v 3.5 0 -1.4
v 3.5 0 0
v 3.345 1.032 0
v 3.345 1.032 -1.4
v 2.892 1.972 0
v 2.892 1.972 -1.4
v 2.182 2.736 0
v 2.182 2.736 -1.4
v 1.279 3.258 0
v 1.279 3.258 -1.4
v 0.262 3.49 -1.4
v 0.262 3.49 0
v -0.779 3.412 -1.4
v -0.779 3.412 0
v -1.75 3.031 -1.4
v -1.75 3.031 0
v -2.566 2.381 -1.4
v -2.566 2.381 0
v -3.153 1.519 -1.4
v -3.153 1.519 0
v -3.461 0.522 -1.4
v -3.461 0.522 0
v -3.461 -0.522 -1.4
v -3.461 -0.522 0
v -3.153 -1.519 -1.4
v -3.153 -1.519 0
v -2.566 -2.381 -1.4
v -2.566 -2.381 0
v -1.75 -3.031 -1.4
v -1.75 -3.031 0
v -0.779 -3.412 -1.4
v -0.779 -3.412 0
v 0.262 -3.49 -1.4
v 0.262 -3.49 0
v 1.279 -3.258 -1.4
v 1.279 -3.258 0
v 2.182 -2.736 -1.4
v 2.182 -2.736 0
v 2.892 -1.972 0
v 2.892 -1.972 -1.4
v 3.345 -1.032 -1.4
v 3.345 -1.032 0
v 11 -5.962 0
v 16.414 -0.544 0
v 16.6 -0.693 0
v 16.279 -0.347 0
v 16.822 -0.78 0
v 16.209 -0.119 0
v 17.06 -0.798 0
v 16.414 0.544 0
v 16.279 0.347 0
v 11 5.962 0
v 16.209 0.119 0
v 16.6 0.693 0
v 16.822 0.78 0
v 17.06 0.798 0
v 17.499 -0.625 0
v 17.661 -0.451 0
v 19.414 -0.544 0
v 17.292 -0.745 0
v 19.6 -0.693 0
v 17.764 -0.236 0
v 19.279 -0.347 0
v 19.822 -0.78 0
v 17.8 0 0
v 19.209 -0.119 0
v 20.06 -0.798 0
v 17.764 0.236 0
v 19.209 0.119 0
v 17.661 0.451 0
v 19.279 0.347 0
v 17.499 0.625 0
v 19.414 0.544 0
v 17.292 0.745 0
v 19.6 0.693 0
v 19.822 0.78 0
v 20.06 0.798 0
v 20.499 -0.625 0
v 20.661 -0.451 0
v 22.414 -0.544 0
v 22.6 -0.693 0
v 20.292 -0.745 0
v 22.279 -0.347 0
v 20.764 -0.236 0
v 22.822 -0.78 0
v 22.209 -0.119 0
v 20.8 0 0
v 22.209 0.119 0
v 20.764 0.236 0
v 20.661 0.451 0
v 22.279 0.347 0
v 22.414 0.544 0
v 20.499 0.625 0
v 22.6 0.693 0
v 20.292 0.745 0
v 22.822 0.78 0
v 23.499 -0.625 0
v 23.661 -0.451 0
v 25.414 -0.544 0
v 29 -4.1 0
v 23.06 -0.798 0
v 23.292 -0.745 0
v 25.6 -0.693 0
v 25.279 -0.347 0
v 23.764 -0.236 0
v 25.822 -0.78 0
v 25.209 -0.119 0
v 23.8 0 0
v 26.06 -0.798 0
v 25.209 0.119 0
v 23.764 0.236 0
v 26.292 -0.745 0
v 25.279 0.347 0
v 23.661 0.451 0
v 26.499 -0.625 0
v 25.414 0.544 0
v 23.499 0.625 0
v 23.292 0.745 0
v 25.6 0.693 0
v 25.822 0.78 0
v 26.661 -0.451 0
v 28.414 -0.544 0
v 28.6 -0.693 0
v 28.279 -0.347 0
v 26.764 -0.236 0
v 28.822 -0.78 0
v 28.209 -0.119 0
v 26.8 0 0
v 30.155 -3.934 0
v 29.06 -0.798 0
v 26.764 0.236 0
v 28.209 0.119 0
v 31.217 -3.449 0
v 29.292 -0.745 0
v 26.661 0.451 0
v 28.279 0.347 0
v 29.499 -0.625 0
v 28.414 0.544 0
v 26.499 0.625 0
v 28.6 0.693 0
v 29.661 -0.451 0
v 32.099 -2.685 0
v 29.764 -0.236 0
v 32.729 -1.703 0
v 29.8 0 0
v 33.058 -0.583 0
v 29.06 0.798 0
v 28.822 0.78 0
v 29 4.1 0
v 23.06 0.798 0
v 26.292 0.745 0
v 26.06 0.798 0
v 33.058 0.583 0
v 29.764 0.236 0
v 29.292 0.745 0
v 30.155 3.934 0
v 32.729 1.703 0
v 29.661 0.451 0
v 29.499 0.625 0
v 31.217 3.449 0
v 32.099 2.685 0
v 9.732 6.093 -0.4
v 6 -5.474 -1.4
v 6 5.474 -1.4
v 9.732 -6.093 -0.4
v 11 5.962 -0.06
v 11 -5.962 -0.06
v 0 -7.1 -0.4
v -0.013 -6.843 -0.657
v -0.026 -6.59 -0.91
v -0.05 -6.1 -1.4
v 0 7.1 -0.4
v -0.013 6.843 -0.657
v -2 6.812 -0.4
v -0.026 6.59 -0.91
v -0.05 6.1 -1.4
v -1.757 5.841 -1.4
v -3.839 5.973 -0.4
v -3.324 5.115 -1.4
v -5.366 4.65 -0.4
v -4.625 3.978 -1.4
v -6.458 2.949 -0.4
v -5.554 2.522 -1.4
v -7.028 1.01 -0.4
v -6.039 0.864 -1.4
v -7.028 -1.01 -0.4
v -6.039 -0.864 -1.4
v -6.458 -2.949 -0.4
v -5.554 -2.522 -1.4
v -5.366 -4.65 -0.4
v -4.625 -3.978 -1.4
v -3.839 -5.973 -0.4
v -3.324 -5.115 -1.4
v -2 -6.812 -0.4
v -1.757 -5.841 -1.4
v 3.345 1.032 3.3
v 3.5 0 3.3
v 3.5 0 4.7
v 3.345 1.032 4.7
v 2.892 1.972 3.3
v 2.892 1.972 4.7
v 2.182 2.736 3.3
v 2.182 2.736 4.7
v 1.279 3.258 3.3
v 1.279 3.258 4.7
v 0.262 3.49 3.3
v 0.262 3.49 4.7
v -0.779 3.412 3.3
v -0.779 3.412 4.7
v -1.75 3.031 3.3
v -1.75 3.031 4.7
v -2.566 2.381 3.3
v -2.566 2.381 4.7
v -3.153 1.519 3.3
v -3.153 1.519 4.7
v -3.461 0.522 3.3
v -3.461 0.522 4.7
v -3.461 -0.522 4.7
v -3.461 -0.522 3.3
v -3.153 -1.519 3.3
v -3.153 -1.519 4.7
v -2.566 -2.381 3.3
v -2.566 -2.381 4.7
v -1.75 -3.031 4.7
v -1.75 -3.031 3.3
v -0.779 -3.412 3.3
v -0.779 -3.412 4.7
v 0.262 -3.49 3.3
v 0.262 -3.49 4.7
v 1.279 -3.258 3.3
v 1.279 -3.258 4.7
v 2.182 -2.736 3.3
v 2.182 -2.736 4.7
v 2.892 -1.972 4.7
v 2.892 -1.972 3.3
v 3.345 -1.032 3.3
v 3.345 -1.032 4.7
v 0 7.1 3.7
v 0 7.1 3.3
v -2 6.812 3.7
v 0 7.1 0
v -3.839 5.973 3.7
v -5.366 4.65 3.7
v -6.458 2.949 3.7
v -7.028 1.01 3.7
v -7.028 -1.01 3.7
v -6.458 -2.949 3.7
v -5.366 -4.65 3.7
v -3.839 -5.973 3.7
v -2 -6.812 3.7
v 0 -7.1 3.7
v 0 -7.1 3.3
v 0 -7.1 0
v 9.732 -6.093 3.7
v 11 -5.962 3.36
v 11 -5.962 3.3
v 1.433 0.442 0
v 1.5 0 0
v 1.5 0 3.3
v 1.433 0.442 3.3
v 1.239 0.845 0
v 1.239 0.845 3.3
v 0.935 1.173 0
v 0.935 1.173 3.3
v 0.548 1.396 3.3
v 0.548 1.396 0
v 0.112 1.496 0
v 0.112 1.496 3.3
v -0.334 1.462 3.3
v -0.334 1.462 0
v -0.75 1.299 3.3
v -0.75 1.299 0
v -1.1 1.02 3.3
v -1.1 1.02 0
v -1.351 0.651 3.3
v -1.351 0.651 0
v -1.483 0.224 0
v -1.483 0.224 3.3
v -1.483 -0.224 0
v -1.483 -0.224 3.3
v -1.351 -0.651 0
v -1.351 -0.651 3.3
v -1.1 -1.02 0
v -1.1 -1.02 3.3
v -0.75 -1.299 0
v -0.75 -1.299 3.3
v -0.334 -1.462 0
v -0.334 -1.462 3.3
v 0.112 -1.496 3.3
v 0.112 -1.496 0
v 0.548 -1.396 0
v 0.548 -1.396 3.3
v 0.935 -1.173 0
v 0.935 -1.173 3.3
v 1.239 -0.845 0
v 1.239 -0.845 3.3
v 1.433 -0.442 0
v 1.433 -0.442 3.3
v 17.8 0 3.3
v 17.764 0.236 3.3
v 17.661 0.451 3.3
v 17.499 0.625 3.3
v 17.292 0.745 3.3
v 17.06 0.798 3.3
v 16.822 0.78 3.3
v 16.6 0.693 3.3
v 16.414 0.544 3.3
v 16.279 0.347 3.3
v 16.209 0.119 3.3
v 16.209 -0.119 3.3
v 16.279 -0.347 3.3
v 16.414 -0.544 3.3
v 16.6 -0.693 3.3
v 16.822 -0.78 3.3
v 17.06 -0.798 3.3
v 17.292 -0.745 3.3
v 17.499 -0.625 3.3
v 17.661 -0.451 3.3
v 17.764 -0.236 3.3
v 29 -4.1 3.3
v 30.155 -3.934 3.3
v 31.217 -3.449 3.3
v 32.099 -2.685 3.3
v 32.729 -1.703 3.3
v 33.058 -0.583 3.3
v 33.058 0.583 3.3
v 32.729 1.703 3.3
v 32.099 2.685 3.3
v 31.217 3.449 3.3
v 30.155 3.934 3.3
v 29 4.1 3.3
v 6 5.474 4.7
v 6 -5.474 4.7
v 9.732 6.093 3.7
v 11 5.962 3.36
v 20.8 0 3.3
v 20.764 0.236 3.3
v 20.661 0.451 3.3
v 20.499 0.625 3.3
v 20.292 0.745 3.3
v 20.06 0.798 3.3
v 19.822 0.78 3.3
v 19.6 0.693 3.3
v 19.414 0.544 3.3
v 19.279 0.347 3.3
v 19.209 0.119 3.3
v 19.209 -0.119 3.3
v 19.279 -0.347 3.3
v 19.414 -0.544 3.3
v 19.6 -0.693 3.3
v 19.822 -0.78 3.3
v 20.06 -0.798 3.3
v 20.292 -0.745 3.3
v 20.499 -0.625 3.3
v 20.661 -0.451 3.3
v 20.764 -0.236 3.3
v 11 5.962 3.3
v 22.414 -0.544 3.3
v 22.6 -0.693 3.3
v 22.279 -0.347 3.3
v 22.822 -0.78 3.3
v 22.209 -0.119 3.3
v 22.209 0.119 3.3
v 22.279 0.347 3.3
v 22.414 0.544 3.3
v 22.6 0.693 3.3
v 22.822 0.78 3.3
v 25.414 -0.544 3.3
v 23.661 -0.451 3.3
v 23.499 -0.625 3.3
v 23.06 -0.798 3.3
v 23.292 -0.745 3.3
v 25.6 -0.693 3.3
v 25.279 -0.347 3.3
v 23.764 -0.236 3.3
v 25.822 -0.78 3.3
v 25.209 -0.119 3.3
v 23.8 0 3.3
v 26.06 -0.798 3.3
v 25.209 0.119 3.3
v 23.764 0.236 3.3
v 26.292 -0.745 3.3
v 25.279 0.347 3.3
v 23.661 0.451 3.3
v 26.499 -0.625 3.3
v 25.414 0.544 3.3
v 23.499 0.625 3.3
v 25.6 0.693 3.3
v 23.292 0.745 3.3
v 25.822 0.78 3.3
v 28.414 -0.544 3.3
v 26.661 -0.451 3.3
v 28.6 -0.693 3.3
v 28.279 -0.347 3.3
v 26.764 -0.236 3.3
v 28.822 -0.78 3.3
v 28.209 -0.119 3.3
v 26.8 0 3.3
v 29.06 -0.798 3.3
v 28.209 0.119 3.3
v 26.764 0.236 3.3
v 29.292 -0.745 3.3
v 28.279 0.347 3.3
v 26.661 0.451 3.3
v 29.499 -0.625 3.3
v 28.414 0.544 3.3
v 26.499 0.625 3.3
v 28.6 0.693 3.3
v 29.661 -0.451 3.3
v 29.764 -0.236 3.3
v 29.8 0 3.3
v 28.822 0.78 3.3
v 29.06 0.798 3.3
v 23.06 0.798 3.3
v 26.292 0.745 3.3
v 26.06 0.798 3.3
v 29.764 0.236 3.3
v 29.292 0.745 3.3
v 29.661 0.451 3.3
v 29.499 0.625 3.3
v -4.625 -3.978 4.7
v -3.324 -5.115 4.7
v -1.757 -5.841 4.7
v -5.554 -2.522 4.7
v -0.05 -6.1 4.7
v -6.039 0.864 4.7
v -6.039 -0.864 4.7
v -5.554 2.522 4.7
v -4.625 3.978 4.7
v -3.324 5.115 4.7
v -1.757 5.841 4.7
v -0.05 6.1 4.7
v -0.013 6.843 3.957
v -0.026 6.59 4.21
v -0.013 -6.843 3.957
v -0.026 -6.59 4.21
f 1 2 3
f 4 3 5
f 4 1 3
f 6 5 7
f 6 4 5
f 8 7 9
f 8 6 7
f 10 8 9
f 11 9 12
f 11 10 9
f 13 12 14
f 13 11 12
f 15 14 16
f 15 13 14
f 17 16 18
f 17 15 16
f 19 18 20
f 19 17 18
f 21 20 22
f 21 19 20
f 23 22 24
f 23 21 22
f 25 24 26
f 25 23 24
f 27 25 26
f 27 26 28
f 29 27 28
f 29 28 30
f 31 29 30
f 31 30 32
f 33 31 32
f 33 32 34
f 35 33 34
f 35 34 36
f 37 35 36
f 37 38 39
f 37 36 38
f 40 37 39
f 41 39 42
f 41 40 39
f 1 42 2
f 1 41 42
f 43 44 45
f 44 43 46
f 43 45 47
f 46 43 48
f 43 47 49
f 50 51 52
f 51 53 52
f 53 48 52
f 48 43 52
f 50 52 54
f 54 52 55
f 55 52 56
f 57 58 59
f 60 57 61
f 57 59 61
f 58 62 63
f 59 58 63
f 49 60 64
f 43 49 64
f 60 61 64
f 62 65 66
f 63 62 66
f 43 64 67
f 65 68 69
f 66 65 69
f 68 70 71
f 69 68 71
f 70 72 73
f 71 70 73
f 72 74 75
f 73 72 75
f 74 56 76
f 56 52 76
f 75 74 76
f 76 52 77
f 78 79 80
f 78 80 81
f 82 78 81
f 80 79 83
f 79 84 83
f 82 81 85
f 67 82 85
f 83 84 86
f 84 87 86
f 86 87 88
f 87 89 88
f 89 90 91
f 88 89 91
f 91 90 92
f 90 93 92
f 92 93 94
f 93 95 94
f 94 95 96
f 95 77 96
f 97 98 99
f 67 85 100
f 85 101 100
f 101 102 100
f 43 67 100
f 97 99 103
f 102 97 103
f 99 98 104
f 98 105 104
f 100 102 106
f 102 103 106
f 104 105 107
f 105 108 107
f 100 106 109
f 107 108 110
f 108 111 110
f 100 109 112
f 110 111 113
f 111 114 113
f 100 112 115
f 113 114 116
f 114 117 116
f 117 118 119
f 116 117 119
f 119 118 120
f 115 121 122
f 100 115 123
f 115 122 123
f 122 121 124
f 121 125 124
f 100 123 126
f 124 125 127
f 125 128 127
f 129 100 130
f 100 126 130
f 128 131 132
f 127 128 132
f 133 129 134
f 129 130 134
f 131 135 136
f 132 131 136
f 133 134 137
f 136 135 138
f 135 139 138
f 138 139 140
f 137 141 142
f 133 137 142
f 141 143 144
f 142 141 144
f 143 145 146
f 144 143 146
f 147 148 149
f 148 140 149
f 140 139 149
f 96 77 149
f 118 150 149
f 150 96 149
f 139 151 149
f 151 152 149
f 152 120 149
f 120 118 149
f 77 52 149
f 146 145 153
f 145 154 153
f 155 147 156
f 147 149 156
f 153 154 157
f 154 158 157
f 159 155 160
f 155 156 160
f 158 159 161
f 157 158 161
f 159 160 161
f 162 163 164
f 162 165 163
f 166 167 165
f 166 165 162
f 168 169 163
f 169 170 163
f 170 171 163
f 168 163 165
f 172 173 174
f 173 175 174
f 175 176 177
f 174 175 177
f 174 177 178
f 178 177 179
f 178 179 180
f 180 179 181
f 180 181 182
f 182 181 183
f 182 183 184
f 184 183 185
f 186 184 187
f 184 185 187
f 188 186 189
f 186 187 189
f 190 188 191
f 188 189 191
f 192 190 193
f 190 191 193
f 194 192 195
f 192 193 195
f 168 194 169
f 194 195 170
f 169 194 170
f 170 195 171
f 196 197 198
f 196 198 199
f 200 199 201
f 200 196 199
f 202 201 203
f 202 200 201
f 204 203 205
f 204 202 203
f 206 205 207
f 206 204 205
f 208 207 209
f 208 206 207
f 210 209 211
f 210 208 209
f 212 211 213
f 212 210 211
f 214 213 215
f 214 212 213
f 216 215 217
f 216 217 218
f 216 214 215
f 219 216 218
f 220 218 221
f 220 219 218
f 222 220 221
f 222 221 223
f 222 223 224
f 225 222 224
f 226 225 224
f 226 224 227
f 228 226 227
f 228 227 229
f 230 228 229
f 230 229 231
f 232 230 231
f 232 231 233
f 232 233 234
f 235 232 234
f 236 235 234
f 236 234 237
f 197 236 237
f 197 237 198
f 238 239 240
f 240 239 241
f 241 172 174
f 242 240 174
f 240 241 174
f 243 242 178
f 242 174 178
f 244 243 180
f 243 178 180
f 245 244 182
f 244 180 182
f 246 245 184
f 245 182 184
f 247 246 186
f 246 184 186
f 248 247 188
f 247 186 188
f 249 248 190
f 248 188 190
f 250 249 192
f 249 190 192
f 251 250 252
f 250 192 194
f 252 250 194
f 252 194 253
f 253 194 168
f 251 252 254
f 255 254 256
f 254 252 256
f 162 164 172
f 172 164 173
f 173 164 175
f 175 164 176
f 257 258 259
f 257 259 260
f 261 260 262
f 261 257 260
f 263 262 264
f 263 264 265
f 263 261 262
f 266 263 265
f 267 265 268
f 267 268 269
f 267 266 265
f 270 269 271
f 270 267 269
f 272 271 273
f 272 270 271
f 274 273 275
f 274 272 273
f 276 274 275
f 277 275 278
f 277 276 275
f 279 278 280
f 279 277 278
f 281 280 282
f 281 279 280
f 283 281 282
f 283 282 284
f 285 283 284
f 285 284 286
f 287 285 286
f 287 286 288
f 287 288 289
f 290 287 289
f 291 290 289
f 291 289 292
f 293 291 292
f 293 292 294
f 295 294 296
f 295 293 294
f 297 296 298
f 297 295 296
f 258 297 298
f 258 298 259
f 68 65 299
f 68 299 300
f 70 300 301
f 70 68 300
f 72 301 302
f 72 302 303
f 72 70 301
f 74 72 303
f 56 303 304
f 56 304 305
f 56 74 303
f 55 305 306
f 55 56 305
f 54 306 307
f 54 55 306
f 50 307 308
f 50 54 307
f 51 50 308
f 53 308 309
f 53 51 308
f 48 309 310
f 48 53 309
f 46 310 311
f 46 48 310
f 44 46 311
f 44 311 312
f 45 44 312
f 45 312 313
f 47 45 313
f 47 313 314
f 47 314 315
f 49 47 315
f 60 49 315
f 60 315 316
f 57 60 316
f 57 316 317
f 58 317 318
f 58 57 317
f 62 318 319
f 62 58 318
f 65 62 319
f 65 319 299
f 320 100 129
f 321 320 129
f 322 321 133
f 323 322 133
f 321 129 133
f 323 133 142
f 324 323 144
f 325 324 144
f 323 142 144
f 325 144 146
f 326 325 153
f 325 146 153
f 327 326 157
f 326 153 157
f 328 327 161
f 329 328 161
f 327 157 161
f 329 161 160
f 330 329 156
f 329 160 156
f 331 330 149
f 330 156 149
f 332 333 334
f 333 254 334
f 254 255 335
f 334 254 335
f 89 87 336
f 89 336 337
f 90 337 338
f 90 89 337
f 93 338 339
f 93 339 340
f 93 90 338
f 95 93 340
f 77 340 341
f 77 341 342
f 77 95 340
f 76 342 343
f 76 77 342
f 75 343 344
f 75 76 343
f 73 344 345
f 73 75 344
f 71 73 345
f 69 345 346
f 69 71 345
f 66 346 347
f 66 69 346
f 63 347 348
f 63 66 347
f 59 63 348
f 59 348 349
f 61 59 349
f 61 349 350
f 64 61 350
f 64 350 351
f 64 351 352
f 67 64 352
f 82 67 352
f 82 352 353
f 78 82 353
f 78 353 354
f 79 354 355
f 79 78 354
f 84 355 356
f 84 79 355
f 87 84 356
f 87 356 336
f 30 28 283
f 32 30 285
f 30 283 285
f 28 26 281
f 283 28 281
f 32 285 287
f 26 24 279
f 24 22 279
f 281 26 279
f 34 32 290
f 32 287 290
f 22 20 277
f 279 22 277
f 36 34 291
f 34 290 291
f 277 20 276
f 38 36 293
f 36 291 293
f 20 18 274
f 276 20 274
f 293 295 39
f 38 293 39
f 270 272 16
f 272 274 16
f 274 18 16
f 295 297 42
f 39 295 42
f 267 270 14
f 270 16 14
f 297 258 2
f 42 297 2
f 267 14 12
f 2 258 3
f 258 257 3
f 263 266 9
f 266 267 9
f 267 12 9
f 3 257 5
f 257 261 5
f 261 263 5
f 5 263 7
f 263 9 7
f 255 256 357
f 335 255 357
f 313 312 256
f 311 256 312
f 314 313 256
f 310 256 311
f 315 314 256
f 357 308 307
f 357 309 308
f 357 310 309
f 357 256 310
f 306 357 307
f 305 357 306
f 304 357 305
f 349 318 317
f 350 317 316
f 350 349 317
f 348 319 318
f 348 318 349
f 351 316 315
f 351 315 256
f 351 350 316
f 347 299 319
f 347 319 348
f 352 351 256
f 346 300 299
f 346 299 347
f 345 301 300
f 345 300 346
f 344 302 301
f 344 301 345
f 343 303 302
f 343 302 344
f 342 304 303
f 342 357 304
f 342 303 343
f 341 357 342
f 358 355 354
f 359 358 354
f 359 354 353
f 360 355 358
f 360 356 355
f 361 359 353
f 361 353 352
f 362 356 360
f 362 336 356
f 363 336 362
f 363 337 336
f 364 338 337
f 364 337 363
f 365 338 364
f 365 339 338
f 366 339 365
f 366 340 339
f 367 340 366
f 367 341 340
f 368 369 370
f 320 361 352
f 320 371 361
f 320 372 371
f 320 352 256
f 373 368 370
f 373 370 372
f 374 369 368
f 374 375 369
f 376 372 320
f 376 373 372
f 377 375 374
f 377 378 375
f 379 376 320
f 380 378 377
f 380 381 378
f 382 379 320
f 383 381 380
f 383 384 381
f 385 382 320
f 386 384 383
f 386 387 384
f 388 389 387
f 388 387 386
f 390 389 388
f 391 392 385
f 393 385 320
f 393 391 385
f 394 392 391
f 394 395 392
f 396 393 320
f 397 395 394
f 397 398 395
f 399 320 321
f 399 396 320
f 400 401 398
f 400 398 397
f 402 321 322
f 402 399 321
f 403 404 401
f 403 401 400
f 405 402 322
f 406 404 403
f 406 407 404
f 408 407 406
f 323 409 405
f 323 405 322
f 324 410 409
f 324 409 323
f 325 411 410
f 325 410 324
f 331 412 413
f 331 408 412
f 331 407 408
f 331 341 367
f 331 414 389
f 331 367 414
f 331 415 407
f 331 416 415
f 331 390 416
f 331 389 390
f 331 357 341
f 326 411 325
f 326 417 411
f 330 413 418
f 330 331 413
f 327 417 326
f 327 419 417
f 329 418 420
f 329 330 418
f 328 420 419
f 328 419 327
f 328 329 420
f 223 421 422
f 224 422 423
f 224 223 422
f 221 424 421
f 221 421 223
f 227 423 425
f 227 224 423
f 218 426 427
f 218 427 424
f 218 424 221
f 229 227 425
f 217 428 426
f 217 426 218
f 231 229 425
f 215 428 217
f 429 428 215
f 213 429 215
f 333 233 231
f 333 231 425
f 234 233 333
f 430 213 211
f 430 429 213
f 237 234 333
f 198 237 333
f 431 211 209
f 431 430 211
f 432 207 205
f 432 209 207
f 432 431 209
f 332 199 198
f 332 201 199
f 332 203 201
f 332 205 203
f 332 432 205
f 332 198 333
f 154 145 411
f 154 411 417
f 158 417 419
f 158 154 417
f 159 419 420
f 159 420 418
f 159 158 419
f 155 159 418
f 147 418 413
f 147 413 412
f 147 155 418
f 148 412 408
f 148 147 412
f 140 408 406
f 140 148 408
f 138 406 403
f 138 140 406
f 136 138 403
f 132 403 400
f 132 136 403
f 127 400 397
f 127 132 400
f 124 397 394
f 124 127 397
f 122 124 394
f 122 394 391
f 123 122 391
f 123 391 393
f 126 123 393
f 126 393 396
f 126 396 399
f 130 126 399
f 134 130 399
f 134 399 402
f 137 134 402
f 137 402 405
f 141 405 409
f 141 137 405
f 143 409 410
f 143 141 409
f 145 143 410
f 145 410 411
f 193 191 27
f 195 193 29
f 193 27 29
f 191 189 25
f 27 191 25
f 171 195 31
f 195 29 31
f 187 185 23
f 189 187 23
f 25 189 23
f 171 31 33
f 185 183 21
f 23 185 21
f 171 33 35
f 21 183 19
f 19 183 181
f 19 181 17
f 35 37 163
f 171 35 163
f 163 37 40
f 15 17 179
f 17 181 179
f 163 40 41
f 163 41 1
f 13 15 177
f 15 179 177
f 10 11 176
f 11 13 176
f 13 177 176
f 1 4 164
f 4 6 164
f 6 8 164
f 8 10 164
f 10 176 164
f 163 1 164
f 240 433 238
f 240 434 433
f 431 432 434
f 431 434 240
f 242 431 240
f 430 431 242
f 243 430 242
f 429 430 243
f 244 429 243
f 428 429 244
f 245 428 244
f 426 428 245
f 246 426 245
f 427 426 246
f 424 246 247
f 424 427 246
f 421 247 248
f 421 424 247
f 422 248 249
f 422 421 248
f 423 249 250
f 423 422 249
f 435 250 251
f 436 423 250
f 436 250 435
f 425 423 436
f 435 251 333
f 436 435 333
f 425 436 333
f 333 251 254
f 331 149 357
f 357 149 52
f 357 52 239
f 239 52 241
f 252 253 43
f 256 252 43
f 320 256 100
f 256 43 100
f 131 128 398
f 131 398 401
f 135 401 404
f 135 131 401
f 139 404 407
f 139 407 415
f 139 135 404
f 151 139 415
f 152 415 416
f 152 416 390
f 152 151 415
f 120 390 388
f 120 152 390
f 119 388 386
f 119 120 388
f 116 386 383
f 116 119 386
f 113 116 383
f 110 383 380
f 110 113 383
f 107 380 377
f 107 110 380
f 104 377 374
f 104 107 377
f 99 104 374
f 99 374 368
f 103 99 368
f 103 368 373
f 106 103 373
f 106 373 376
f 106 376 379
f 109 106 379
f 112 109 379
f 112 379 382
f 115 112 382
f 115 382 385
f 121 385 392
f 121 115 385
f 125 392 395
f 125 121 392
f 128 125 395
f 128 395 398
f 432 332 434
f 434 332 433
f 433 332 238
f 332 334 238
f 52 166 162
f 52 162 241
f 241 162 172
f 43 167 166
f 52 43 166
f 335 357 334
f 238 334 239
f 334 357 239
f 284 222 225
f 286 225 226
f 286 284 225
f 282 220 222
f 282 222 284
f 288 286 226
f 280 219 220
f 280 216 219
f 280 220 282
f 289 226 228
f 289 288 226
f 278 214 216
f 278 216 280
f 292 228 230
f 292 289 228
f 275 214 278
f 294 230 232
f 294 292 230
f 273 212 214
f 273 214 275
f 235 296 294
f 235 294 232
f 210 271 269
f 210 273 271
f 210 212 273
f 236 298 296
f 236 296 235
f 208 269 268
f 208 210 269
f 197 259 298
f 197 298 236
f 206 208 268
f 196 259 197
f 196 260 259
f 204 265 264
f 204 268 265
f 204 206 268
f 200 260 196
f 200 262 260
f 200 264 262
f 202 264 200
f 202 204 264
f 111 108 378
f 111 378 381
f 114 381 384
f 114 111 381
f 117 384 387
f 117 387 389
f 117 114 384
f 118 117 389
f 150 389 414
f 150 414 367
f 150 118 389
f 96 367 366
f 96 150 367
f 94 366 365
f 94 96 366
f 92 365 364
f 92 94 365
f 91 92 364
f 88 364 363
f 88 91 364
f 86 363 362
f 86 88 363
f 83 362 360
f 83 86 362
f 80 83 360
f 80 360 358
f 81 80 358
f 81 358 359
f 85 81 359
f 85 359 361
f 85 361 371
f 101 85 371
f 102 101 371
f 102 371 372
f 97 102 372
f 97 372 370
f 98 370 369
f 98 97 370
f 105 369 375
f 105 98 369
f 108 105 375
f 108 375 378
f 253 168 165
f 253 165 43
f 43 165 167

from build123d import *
from OCP.BRepFilletAPI import BRepFilletAPI_MakeChamfer

# Parameters (mm, degrees)
ESQUISSE1_R             = 0.8
ESQUISSE1_R_2           = 1.5
BOSS_EXTRU_1_DEPTH      = 3.3
BOSS_EXTRU_2_DEPTH      = 1.4
BOSS_EXTRU_2_DEPTH_BACK = 4.7
ESQUISSE2_R             = 3.5
CHANFREIN1_SIZE         = 5
CHANFREIN1_SIZE2        = 1.339745962
CHANFREIN3_SIZE         = 1


with BuildPart() as part:
    # Esquisse1 → Boss.-Extru.1 (new body)
    with BuildSketch(Plane.XY):
        with BuildLine():
            Line((0, -7.1), (29, -4.1))
            ThreePointArc((29, -4.1), (33.1, 0), (29, 4.1))
            Line((29, 4.1), (0, 7.1))
            ThreePointArc((0, 7.1), (-7.1, 0), (0, -7.1))
        make_face()
        with Locations((29, 0)):
            Circle(ESQUISSE1_R, mode=Mode.SUBTRACT)
        with Locations((26, 0)):
            Circle(ESQUISSE1_R, mode=Mode.SUBTRACT)
        with Locations((23, 0)):
            Circle(ESQUISSE1_R, mode=Mode.SUBTRACT)
        with Locations((20, 0)):
            Circle(ESQUISSE1_R, mode=Mode.SUBTRACT)
        with Locations((17, 0)):
            Circle(ESQUISSE1_R, mode=Mode.SUBTRACT)
        Circle(ESQUISSE1_R_2, mode=Mode.SUBTRACT)
    extrude(amount=BOSS_EXTRU_1_DEPTH)

    # Esquisse2 → Boss.-Extru.2 (add, two sides: drawn at the far end of the back side and taken through both)
    with BuildSketch(Plane.XY.offset(3.3).offset(-BOSS_EXTRU_2_DEPTH_BACK)):
        with BuildLine():
            Line((0, -7.1), (11, -5.962068966))
            Line((11, -5.962068966), (11, 5.962068966))
            Line((11, 5.962068966), (0, 7.1))
            ThreePointArc((0, 7.1), (-7.1, 0), (0, -7.1))
        make_face()
        Circle(ESQUISSE2_R, mode=Mode.SUBTRACT)
    extrude(amount=BOSS_EXTRU_2_DEPTH + BOSS_EXTRU_2_DEPTH_BACK)

    # Chanfrein1: one chamfer whose edges measure the first distance from different faces: ONE call of the kernel's chamfer builder (chamfer() names one face for all edges)
    chanfrein1_edges_1 = [part.edges().sort_by_distance(p)[0] for p in [
        (11, 0, -1.4),
    ]]
    chanfrein1_side_1 = [part.faces().sort_by_distance(p)[0] for p in [
        (5.476327604, -6.302201317, -1.4),
    ]]
    chanfrein1_edges_2 = [part.edges().sort_by_distance(p)[0] for p in [
        (11, 0, 4.7),
    ]]
    chanfrein1_side_2 = [part.faces().sort_by_distance(p)[0] for p in [
        (5.476327604, -6.302201317, 4.7),
    ]]
    chanfrein1 = BRepFilletAPI_MakeChamfer(part.part.solid().wrapped)
    for e in chanfrein1_edges_1:
        chanfrein1.Add(CHANFREIN1_SIZE, CHANFREIN1_SIZE2, e.wrapped, chanfrein1_side_1[0].wrapped)  # the first distance lies on this face
    for e in chanfrein1_edges_2:
        chanfrein1.Add(CHANFREIN1_SIZE, CHANFREIN1_SIZE2, e.wrapped, chanfrein1_side_2[0].wrapped)  # the first distance lies on this face
    add(Compound.cast(chanfrein1.Shape()), mode=Mode.REPLACE)

    # Chanfrein3
    chanfrein3_edges = [part.edges().sort_by_distance(p)[0] for p in [
        (3, -6.789655172, 4.7),
    ]]
    chamfer(chanfrein3_edges, length=CHANFREIN3_SIZE)
    chanfrein3_2_edges = [part.edges().sort_by_distance(p)[0] for p in [
        (3, -6.789655172, -1.4),
    ]]
    chamfer(chanfrein3_2_edges, length=CHANFREIN3_SIZE)
    chanfrein3_3_edges = [part.edges().sort_by_distance(p)[0] for p in [
        (3, 6.789655172, 4.7),
    ]]
    chamfer(chanfrein3_3_edges, length=CHANFREIN3_SIZE)
    chanfrein3_4_edges = [part.edges().sort_by_distance(p)[0] for p in [
        (3, 6.789655172, -1.4),
    ]]
    chamfer(chanfrein3_4_edges, length=CHANFREIN3_SIZE)
    chanfrein3_5_edges = [part.edges().sort_by_distance(p)[0] for p in [
        (-7.1, 0, 4.7),
    ]]
    chamfer(chanfrein3_5_edges, length=CHANFREIN3_SIZE)
    chanfrein3_6_edges = [part.edges().sort_by_distance(p)[0] for p in [
        (-7.1, 0, -1.4),
    ]]
    chamfer(chanfrein3_6_edges, length=CHANFREIN3_SIZE)


solid = part.part
